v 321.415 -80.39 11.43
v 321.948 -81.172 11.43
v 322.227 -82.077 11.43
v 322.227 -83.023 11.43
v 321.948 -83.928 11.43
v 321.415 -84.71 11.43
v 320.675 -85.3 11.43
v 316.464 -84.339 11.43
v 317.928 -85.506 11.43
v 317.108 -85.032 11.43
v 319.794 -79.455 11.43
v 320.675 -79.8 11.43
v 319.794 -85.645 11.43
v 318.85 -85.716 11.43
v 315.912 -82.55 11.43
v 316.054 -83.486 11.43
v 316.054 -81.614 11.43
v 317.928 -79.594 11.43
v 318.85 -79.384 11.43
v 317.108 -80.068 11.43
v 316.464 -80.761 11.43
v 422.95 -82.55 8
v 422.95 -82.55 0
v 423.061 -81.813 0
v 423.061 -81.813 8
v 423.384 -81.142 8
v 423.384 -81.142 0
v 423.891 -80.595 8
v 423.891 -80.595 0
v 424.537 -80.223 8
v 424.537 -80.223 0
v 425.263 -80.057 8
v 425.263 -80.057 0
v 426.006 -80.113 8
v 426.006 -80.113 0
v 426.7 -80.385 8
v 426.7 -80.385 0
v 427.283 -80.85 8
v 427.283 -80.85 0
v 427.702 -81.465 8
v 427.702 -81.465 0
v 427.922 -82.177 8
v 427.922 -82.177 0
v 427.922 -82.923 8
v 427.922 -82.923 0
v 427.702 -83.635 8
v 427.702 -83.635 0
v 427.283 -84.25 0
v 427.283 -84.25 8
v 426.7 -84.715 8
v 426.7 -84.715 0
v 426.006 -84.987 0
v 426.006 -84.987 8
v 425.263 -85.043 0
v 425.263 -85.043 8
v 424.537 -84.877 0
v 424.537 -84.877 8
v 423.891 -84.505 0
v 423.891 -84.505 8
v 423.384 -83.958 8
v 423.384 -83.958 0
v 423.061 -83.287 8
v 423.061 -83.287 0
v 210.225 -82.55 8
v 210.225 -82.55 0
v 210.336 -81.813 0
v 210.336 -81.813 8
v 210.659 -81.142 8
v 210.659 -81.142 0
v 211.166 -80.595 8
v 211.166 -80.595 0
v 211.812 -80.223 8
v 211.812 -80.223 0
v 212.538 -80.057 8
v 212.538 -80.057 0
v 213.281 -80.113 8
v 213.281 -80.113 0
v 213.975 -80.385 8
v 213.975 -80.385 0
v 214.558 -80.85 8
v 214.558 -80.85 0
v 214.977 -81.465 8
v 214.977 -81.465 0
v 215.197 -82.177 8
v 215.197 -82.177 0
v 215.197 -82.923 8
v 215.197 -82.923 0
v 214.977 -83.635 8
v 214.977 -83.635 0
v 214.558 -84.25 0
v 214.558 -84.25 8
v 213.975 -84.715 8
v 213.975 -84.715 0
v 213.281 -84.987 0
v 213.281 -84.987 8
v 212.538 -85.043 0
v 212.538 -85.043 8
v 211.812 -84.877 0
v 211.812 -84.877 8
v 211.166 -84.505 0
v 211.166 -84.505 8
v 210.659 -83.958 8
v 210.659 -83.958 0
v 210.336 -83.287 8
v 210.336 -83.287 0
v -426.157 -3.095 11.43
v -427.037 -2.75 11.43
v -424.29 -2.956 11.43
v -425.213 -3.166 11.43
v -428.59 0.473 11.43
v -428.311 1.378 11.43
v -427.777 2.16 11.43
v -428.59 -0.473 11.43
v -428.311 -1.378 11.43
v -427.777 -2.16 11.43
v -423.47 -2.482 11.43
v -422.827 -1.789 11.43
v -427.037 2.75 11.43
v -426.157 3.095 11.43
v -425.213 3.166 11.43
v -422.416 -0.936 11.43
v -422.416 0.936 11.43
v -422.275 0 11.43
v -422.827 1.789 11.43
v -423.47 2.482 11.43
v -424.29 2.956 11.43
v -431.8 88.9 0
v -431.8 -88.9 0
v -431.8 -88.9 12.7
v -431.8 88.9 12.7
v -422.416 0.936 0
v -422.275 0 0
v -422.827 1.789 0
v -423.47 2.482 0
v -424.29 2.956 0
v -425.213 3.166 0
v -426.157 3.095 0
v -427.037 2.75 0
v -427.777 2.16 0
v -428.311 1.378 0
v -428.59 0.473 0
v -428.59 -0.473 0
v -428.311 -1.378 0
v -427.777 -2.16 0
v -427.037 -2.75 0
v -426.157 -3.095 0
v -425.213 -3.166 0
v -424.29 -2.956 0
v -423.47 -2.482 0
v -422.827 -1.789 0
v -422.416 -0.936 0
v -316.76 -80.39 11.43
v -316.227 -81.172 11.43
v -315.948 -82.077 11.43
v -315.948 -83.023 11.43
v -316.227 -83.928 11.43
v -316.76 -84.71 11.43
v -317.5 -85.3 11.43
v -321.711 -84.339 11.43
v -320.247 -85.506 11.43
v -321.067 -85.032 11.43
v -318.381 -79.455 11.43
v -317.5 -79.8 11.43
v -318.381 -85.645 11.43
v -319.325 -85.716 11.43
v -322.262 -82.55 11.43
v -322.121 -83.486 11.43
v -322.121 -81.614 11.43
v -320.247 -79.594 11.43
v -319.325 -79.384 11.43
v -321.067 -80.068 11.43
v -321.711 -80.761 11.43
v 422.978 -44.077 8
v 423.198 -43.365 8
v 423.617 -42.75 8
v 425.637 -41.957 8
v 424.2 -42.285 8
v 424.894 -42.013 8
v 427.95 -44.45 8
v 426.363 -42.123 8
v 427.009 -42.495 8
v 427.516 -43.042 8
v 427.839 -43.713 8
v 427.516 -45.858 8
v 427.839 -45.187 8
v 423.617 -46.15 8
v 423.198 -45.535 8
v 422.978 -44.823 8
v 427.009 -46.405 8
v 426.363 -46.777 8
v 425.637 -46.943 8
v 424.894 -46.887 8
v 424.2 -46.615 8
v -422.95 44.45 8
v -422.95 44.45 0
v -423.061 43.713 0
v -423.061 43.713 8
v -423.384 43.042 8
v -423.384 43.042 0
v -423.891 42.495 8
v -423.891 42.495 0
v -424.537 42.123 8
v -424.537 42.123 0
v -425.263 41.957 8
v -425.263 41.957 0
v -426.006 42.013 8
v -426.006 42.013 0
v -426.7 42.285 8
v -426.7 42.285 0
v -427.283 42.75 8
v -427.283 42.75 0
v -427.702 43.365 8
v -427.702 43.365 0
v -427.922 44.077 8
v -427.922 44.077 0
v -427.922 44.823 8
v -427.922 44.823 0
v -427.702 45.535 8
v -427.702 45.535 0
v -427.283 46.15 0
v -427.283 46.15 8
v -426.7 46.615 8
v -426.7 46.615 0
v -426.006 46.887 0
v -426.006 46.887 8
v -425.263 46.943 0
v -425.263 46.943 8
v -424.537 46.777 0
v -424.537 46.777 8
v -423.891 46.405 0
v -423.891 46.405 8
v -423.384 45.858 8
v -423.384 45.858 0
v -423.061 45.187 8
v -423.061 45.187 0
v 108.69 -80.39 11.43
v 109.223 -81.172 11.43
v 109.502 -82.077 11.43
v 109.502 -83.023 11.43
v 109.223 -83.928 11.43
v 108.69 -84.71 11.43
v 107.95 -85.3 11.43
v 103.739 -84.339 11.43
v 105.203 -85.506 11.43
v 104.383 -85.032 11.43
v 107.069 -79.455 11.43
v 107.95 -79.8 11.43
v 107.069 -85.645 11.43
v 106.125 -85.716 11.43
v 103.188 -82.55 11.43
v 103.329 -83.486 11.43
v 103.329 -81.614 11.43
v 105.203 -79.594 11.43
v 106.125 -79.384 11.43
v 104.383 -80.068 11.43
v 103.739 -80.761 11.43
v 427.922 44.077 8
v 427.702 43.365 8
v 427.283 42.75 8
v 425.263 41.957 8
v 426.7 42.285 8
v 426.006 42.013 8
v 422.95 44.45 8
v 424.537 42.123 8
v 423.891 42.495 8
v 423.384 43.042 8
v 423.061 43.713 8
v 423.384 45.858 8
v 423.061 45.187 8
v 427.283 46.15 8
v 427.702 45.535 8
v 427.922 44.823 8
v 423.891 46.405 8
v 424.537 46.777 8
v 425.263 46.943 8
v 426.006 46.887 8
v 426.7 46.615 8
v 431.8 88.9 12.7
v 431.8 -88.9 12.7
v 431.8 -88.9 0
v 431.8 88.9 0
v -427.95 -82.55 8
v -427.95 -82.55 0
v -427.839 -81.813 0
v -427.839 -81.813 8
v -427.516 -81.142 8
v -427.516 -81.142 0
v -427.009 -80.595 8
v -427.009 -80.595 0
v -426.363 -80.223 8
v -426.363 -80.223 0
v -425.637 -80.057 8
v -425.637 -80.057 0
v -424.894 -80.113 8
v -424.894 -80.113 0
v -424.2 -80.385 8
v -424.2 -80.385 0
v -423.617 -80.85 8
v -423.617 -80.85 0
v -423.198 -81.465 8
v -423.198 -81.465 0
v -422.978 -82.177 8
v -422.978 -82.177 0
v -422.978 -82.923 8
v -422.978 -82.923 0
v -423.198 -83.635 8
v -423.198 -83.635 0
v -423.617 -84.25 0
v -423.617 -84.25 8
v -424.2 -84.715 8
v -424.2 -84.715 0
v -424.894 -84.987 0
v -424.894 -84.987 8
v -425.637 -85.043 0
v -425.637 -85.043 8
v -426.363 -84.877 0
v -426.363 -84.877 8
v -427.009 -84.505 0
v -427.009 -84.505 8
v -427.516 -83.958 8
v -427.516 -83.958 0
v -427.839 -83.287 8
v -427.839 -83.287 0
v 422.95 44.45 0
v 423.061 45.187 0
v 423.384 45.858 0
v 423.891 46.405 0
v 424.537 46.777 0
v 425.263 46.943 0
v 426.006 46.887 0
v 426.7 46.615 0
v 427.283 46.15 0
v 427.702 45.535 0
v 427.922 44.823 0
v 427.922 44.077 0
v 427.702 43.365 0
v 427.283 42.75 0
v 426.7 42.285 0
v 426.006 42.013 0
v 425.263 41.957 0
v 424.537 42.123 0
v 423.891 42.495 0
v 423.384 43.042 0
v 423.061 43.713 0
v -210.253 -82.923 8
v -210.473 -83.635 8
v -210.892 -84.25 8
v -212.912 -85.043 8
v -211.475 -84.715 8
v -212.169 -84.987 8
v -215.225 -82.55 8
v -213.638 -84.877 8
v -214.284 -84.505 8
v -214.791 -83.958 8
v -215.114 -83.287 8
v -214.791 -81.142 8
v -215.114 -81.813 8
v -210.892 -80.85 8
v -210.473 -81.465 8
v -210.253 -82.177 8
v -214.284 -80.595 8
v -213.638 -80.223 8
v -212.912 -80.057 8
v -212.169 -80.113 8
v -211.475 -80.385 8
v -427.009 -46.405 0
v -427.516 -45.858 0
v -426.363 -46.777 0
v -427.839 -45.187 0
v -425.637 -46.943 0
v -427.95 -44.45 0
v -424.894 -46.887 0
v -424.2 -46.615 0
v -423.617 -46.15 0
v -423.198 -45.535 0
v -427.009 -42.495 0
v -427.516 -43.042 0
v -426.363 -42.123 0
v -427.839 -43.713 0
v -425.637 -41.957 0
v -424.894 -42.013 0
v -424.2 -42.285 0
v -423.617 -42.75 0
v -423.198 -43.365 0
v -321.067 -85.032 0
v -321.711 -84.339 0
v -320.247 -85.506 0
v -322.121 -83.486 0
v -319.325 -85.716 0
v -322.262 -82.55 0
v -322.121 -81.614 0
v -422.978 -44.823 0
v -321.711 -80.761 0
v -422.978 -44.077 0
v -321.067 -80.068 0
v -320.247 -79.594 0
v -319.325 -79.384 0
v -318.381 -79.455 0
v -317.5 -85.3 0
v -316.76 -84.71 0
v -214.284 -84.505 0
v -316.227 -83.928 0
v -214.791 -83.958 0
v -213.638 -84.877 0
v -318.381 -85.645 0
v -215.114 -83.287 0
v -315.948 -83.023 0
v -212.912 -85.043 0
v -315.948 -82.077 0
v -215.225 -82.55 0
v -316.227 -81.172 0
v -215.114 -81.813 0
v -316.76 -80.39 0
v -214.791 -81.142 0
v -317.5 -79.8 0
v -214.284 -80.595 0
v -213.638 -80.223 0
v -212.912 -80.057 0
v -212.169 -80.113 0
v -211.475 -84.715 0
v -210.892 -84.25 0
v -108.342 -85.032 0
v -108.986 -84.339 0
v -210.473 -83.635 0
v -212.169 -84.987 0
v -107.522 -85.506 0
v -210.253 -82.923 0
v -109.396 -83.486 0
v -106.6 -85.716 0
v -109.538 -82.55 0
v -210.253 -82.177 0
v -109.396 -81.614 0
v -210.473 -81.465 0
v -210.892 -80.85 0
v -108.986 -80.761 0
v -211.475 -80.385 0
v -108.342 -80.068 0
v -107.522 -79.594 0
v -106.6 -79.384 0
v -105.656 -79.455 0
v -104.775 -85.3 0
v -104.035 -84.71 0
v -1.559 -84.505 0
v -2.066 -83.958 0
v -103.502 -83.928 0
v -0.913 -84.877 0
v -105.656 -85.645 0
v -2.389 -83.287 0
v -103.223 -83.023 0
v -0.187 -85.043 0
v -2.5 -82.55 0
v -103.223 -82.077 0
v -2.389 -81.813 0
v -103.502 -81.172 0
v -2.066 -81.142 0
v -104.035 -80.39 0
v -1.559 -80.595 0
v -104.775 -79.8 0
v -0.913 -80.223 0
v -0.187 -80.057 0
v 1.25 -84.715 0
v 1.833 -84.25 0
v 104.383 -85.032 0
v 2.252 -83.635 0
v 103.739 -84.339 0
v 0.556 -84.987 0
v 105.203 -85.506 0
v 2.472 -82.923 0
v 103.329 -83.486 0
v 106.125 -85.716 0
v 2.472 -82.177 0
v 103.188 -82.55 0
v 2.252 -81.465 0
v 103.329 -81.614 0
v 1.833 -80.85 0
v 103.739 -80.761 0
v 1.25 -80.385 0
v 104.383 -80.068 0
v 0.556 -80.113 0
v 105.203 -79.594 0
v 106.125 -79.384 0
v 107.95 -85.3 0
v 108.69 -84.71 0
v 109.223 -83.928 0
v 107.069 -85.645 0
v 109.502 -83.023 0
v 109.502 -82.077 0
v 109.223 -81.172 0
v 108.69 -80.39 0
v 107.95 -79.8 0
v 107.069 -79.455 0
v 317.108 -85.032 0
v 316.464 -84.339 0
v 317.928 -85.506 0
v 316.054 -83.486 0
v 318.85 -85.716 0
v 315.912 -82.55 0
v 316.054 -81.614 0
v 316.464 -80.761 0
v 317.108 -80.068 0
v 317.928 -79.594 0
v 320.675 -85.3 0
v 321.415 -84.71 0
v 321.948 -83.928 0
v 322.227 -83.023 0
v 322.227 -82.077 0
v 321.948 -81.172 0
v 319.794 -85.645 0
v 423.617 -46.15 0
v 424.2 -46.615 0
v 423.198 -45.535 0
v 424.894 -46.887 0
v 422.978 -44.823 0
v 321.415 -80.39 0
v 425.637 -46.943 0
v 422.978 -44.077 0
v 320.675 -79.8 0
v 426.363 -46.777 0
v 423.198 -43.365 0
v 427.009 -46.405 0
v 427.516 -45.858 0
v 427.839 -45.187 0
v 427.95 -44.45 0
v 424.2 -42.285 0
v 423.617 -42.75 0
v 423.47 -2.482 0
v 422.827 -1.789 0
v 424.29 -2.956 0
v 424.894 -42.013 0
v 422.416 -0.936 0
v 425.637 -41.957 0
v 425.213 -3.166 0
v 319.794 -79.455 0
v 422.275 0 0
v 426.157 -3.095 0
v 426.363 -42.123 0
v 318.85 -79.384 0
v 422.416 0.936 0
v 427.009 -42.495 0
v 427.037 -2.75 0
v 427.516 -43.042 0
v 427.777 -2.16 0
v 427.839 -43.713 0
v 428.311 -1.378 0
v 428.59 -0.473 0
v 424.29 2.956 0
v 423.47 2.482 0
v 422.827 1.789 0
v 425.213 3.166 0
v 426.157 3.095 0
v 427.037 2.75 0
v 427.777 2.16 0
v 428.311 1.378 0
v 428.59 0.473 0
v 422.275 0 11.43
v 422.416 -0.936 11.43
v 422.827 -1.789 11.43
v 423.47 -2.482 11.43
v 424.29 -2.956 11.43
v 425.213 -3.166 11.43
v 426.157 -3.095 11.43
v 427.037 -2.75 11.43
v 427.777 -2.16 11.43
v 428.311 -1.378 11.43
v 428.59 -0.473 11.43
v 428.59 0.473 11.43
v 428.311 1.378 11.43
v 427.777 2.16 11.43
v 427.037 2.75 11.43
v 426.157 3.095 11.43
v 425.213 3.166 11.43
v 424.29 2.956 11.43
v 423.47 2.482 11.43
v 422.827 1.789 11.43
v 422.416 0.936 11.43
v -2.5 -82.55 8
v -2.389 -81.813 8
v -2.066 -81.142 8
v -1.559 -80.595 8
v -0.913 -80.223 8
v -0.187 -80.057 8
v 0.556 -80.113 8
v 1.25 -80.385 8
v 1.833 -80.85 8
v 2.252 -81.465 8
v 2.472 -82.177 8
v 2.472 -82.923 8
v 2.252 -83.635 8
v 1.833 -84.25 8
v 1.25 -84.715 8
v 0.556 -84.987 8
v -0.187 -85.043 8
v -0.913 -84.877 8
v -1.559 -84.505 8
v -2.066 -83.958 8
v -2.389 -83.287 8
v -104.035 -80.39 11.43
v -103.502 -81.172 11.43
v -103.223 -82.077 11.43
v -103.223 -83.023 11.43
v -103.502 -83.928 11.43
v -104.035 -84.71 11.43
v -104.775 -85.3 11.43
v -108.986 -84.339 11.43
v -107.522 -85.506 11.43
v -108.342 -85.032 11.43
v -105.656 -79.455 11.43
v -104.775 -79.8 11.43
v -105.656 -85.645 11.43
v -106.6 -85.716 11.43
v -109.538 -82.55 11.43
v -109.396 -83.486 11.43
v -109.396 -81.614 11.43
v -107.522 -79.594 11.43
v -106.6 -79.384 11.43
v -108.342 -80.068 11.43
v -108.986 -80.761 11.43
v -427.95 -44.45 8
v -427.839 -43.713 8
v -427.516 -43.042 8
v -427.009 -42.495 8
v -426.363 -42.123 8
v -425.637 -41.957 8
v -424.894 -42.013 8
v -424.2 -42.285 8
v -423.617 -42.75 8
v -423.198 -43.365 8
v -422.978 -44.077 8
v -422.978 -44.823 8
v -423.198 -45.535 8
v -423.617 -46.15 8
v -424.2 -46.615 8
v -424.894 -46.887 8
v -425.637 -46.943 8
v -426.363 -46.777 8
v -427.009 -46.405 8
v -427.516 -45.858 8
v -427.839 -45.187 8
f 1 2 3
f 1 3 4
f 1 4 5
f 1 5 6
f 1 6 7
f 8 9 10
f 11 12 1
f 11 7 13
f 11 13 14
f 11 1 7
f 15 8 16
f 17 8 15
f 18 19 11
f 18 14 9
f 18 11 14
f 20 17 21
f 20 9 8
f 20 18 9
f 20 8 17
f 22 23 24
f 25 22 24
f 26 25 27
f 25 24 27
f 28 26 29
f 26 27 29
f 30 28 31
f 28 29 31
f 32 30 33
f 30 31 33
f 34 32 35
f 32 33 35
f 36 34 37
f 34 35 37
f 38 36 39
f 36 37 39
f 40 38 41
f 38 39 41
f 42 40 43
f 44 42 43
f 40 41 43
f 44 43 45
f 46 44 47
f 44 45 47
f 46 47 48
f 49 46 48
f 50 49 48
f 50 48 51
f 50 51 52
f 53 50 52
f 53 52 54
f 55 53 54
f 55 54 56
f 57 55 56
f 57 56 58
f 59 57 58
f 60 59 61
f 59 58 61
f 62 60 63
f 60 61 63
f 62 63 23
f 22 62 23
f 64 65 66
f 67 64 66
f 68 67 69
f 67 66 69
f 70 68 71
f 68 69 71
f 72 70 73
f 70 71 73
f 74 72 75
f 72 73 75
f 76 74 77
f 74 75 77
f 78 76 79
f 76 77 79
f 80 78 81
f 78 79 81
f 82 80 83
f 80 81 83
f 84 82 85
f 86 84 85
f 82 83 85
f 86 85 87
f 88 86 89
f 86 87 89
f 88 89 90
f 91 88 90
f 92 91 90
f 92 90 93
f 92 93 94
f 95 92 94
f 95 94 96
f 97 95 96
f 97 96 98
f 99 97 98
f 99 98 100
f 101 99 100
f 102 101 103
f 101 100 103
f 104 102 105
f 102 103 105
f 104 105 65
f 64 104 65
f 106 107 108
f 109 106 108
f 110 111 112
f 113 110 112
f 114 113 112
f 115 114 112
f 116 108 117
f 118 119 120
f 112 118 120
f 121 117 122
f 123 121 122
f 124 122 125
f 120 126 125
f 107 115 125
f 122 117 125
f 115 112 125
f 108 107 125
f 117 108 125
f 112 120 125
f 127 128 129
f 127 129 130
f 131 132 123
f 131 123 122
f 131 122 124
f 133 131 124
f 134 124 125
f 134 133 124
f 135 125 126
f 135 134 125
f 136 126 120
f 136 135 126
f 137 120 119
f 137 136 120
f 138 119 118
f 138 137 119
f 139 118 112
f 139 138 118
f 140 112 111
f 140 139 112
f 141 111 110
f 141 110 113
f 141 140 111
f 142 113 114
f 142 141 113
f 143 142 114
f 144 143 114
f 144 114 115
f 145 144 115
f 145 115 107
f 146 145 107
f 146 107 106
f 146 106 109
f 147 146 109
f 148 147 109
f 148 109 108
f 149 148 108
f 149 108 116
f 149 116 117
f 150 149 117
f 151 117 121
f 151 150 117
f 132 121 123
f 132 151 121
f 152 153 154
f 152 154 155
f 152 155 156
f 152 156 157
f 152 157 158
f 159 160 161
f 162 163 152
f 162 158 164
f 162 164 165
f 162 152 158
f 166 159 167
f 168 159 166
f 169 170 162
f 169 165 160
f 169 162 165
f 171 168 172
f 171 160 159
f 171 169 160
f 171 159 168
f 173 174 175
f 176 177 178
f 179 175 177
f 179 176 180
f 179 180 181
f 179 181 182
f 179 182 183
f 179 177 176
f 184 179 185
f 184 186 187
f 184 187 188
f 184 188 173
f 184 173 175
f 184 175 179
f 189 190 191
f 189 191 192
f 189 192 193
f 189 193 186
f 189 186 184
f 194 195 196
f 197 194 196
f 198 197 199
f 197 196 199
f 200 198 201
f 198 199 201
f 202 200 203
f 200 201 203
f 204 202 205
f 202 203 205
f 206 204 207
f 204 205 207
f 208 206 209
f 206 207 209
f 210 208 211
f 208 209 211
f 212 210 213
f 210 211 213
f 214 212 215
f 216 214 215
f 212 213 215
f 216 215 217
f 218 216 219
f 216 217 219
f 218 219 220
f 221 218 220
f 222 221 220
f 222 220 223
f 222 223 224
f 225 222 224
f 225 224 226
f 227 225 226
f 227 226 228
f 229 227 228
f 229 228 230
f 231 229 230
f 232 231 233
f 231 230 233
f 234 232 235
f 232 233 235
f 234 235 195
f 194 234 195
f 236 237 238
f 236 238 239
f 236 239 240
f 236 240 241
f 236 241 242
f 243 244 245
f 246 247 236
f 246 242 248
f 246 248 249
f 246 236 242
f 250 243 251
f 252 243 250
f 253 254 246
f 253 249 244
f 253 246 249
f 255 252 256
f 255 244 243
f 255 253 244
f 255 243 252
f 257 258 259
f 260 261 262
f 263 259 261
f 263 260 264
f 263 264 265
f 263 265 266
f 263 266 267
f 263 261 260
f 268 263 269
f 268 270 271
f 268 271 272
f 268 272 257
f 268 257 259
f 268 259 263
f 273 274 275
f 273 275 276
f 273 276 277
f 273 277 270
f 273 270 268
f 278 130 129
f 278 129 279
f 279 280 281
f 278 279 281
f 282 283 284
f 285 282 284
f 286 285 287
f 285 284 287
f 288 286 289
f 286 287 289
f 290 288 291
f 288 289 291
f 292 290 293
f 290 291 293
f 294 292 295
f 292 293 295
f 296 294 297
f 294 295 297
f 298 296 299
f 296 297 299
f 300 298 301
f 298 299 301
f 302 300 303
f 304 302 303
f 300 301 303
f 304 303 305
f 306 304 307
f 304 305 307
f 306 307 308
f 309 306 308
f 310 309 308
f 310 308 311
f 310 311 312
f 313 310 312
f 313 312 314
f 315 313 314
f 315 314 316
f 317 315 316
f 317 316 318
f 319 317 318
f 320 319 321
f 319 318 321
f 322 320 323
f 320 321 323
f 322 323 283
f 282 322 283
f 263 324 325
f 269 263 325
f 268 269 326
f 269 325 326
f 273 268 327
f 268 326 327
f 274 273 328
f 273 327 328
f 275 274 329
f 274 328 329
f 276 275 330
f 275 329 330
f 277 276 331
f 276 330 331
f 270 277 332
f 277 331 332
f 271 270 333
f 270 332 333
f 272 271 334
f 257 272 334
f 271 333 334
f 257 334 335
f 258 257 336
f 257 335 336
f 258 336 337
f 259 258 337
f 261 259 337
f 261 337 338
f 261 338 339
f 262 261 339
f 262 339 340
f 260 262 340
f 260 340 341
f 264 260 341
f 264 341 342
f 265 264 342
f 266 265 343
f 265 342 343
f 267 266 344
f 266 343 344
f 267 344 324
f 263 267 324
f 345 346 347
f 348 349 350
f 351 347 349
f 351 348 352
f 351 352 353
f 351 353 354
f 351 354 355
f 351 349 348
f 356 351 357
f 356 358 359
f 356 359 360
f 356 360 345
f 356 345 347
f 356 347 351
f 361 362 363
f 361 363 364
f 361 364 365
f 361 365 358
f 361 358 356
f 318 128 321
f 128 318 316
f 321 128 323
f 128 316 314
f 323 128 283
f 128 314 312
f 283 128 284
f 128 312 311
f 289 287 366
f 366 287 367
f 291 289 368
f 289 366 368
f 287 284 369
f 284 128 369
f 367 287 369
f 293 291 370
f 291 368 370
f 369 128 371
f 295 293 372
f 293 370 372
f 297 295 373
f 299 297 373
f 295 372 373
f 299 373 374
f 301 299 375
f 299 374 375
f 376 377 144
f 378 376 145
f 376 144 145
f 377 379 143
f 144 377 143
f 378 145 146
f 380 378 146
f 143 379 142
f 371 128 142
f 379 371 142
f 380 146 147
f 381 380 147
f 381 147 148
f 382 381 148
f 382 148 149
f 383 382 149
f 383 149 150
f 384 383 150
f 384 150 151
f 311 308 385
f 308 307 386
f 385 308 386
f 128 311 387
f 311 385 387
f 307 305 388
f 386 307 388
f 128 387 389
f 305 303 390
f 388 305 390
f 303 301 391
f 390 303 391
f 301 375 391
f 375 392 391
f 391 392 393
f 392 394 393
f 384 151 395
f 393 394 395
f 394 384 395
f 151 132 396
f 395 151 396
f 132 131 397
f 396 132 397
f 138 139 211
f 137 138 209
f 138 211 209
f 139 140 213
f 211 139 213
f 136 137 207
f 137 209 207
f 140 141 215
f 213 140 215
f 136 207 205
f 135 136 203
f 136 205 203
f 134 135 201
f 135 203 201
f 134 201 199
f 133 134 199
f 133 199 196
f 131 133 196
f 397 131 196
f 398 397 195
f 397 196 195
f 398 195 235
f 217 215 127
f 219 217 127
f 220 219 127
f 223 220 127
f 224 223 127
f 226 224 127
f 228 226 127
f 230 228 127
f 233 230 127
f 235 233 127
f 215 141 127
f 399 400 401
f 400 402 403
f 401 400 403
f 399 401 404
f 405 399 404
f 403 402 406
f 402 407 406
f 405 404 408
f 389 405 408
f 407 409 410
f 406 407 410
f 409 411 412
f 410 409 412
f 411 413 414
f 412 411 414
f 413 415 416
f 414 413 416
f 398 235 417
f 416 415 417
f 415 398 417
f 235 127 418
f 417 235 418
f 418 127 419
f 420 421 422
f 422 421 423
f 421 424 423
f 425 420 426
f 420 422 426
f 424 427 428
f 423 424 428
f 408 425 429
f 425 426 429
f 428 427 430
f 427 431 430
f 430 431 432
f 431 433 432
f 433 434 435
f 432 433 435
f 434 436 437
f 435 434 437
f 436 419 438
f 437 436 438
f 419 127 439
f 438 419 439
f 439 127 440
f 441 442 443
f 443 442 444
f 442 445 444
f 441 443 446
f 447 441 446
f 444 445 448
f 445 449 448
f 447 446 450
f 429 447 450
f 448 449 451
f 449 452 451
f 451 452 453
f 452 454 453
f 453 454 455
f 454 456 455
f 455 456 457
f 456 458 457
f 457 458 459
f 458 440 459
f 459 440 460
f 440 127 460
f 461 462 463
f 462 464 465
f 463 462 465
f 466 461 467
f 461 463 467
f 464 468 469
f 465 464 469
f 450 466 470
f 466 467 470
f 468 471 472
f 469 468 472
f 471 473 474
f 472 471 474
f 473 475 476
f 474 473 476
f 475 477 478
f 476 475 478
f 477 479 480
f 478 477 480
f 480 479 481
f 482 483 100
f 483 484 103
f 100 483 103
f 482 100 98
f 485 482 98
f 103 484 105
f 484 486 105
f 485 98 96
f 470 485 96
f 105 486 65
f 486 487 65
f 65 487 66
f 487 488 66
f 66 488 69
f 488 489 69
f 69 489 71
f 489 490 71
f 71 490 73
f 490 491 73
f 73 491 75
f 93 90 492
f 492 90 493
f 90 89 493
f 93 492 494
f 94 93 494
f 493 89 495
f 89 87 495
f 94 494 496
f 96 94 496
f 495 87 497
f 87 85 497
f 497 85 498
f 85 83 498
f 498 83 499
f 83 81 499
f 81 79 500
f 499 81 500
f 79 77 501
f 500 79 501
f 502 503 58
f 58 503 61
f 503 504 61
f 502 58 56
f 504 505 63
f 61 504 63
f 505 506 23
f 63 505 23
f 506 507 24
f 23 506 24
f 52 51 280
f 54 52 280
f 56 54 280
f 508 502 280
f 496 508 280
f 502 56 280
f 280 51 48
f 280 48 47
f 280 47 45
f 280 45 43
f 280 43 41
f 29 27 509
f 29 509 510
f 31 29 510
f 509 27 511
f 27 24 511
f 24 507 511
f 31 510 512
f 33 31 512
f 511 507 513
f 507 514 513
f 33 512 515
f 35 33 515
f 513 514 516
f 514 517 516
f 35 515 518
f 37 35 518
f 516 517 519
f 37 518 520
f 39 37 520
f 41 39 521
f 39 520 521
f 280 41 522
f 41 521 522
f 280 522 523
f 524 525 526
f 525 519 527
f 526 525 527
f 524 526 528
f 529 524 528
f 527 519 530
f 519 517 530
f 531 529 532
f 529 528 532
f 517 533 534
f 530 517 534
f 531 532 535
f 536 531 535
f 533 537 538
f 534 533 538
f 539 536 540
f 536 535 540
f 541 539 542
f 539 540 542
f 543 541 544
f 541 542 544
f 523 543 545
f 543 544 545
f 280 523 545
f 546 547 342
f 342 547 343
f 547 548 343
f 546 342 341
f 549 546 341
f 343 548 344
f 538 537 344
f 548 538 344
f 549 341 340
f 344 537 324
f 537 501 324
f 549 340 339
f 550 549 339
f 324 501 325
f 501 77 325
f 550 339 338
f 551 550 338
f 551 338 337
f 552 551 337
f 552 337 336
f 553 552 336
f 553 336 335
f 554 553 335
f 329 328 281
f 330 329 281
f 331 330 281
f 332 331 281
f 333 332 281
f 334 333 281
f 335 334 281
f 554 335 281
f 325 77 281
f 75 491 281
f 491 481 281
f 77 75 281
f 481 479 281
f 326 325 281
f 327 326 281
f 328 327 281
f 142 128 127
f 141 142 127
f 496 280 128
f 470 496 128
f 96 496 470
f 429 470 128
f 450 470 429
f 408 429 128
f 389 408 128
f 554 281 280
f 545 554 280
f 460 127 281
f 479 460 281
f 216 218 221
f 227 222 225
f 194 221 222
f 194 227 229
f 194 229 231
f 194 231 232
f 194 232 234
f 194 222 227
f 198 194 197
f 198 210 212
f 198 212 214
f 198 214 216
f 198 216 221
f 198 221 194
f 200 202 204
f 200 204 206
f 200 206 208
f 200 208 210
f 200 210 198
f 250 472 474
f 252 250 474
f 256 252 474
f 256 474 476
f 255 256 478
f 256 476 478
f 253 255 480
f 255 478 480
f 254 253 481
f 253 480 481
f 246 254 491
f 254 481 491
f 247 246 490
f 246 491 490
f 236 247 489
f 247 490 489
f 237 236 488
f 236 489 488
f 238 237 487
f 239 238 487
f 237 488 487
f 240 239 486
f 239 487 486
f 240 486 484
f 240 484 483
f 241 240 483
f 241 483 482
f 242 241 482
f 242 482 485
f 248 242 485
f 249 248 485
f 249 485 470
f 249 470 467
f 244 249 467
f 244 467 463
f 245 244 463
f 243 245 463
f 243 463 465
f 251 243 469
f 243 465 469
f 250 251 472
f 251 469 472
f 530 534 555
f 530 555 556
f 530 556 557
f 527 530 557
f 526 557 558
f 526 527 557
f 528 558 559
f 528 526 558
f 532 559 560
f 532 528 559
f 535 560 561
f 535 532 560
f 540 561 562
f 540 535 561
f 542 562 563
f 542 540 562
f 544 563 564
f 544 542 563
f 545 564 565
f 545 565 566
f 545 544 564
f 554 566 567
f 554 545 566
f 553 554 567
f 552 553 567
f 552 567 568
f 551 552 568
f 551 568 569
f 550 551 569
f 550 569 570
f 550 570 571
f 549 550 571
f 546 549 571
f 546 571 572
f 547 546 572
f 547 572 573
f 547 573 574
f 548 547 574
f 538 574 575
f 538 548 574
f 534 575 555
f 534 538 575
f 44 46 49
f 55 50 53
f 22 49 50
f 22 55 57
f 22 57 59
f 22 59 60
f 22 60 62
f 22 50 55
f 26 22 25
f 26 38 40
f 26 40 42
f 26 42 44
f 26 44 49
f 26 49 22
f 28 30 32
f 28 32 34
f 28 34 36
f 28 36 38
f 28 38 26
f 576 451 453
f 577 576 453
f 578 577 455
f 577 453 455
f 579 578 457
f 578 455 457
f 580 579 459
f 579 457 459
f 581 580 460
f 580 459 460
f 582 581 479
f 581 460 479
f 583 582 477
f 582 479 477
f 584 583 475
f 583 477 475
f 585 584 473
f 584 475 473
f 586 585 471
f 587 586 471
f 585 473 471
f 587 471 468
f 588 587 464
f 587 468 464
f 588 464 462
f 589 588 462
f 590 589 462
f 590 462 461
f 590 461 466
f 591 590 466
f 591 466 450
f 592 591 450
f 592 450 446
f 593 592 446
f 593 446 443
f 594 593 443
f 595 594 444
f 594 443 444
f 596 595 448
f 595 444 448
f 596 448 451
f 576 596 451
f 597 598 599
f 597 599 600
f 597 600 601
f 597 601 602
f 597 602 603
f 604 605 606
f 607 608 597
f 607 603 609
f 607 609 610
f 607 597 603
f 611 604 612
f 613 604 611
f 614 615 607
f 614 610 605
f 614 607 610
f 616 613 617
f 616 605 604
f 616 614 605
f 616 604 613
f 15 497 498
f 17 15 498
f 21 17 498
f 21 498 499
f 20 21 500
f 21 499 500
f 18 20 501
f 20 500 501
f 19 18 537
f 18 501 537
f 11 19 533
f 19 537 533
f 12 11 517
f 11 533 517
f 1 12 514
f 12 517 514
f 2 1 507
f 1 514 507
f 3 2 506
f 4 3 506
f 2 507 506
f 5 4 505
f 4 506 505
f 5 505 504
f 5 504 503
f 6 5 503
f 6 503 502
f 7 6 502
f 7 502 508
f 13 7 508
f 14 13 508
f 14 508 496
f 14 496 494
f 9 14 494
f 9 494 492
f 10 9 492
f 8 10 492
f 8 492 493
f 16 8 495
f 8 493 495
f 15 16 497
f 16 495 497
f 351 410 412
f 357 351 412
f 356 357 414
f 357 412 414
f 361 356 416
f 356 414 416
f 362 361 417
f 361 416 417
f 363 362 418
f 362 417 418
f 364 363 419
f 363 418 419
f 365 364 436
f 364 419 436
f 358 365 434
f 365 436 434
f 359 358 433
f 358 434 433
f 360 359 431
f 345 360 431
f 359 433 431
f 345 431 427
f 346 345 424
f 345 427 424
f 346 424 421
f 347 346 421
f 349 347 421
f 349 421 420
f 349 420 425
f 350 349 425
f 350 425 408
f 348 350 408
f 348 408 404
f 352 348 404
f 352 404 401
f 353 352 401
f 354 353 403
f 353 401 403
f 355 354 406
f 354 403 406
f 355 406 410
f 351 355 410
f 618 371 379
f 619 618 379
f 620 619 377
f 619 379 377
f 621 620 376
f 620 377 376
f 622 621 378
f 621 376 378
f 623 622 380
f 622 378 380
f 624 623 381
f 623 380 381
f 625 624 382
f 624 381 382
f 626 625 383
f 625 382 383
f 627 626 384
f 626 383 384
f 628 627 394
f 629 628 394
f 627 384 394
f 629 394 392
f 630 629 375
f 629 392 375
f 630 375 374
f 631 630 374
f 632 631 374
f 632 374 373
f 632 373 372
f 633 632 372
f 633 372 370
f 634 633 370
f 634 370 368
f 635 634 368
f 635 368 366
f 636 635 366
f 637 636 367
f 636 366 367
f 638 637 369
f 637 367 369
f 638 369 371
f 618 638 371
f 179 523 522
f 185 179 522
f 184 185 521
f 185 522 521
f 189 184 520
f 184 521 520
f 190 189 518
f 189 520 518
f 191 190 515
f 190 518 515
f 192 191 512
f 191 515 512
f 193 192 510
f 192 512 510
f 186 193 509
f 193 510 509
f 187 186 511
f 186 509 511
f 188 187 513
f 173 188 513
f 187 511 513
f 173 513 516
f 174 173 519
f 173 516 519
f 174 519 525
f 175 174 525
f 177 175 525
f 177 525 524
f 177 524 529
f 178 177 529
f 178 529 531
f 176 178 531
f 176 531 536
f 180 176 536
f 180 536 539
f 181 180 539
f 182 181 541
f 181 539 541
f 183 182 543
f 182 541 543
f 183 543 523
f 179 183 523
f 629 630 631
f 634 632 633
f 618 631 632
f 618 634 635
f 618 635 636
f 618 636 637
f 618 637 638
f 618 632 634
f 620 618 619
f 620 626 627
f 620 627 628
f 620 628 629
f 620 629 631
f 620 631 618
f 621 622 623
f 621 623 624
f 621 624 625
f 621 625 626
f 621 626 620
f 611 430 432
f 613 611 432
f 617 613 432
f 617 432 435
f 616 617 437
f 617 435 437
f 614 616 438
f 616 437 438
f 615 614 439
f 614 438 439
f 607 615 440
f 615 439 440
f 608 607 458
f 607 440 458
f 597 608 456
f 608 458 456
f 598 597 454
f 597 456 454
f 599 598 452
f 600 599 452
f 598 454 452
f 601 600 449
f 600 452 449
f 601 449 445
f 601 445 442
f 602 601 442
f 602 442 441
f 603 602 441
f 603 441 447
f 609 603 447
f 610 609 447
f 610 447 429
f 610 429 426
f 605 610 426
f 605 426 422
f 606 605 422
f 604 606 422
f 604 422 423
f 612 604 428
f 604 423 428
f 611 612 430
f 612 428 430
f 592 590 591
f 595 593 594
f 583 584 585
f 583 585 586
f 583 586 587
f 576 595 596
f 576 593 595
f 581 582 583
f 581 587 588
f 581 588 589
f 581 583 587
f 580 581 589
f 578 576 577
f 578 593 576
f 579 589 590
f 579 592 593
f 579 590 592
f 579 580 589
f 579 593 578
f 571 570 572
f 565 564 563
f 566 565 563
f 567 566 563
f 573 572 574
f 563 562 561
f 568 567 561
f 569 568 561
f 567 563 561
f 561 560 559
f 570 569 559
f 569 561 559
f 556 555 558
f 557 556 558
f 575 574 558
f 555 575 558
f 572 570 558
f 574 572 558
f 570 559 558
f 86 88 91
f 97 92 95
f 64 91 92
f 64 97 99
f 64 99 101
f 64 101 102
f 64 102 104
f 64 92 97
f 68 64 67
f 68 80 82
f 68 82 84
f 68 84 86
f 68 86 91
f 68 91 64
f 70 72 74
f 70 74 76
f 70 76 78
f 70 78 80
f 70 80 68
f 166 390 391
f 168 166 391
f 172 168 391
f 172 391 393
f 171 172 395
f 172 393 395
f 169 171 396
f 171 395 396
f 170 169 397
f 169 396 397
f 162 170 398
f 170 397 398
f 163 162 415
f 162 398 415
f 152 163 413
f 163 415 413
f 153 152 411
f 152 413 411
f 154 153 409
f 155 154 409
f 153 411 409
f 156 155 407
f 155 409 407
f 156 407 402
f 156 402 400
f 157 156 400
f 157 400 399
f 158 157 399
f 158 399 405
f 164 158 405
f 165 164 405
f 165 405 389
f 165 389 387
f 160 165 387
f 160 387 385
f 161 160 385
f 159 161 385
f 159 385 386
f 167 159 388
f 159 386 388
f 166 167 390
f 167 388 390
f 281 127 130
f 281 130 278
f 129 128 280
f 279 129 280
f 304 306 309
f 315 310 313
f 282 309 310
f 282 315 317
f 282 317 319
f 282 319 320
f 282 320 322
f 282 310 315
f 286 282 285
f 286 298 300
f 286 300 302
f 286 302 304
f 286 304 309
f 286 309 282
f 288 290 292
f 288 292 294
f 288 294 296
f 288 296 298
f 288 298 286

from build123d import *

# Parameters (mm, degrees)
SKETCH1_W           = 863.6
SKETCH1_H           = 177.8
BOSS_EXTRUDE1_DEPTH = 12.7
SKETCH2_R           = 3.175
CUT_EXTRUDE3_DEPTH  = 11.43
SKETCH3_R           = 2.5
CUT_EXTRUDE4_DEPTH  = 8
SKETCH5_R           = 2.5
CUT_EXTRUDE6_DEPTH  = 8
SKETCH6_R           = 3.175
CUT_EXTRUDE7_DEPTH  = 11.43


with BuildPart() as part:
    # Sketch1 → Boss-Extrude1 (new body)
    with BuildSketch(Plane.XY):
        Rectangle(SKETCH1_W, SKETCH1_H)
    extrude(amount=BOSS_EXTRUDE1_DEPTH)

    # Sketch2 → Cut-Extrude3 (cut)
    with BuildSketch(Plane.XY):
        with Locations((-425.45, 0)):
            Circle(SKETCH2_R)
        with Locations(Location((425.45, 0, 0), (0, 0, 180))):
            Circle(SKETCH2_R)
    extrude(amount=CUT_EXTRUDE3_DEPTH, mode=Mode.SUBTRACT)

    # Sketch3 → Cut-Extrude4 (cut)
    with BuildSketch(Plane(origin=(0, 0, 0), x_dir=(-1, 0, 0), z_dir=(0, 0, -1))):
        with Locations((-425.45, 44.45)):
            Circle(SKETCH3_R)
        with Locations(Location((425.45, 44.45, 0), (0, 0, 180))):
            Circle(SKETCH3_R)
        with Locations((425.45, -44.45)):
            Circle(SKETCH3_R)
        with Locations(Location((-425.45, -44.45, 0), (0, 0, 180))):
            Circle(SKETCH3_R)
    extrude(amount=-CUT_EXTRUDE4_DEPTH, mode=Mode.SUBTRACT)

    # Sketch5 → Cut-Extrude6 (cut)
    with BuildSketch(Plane(origin=(0, 0, 0), x_dir=(-1, 0, 0), z_dir=(0, 0, -1))):
        with Locations((-425.45, -82.55)):
            Circle(SKETCH5_R)
        with Locations((-212.725, -82.55)):
            Circle(SKETCH5_R)
        with Locations((0, -82.55)):
            Circle(SKETCH5_R)
        with Locations((212.725, -82.55)):
            Circle(SKETCH5_R)
        with Locations((425.45, -82.55)):
            Circle(SKETCH5_R)
    extrude(amount=-CUT_EXTRUDE6_DEPTH, mode=Mode.SUBTRACT)

    # Sketch6 → Cut-Extrude7 (cut)
    with BuildSketch(Plane(origin=(0, 0, 0), x_dir=(-1, 0, 0), z_dir=(0, 0, -1))):
        with Locations((-319.0875, -82.55)):
            Circle(SKETCH6_R)
        with Locations((-106.3625, -82.55)):
            Circle(SKETCH6_R)
        with Locations((106.3625, -82.55)):
            Circle(SKETCH6_R)
        with Locations((319.0875, -82.55)):
            Circle(SKETCH6_R)
    extrude(amount=-CUT_EXTRUDE7_DEPTH, mode=Mode.SUBTRACT)


solid = part.part
